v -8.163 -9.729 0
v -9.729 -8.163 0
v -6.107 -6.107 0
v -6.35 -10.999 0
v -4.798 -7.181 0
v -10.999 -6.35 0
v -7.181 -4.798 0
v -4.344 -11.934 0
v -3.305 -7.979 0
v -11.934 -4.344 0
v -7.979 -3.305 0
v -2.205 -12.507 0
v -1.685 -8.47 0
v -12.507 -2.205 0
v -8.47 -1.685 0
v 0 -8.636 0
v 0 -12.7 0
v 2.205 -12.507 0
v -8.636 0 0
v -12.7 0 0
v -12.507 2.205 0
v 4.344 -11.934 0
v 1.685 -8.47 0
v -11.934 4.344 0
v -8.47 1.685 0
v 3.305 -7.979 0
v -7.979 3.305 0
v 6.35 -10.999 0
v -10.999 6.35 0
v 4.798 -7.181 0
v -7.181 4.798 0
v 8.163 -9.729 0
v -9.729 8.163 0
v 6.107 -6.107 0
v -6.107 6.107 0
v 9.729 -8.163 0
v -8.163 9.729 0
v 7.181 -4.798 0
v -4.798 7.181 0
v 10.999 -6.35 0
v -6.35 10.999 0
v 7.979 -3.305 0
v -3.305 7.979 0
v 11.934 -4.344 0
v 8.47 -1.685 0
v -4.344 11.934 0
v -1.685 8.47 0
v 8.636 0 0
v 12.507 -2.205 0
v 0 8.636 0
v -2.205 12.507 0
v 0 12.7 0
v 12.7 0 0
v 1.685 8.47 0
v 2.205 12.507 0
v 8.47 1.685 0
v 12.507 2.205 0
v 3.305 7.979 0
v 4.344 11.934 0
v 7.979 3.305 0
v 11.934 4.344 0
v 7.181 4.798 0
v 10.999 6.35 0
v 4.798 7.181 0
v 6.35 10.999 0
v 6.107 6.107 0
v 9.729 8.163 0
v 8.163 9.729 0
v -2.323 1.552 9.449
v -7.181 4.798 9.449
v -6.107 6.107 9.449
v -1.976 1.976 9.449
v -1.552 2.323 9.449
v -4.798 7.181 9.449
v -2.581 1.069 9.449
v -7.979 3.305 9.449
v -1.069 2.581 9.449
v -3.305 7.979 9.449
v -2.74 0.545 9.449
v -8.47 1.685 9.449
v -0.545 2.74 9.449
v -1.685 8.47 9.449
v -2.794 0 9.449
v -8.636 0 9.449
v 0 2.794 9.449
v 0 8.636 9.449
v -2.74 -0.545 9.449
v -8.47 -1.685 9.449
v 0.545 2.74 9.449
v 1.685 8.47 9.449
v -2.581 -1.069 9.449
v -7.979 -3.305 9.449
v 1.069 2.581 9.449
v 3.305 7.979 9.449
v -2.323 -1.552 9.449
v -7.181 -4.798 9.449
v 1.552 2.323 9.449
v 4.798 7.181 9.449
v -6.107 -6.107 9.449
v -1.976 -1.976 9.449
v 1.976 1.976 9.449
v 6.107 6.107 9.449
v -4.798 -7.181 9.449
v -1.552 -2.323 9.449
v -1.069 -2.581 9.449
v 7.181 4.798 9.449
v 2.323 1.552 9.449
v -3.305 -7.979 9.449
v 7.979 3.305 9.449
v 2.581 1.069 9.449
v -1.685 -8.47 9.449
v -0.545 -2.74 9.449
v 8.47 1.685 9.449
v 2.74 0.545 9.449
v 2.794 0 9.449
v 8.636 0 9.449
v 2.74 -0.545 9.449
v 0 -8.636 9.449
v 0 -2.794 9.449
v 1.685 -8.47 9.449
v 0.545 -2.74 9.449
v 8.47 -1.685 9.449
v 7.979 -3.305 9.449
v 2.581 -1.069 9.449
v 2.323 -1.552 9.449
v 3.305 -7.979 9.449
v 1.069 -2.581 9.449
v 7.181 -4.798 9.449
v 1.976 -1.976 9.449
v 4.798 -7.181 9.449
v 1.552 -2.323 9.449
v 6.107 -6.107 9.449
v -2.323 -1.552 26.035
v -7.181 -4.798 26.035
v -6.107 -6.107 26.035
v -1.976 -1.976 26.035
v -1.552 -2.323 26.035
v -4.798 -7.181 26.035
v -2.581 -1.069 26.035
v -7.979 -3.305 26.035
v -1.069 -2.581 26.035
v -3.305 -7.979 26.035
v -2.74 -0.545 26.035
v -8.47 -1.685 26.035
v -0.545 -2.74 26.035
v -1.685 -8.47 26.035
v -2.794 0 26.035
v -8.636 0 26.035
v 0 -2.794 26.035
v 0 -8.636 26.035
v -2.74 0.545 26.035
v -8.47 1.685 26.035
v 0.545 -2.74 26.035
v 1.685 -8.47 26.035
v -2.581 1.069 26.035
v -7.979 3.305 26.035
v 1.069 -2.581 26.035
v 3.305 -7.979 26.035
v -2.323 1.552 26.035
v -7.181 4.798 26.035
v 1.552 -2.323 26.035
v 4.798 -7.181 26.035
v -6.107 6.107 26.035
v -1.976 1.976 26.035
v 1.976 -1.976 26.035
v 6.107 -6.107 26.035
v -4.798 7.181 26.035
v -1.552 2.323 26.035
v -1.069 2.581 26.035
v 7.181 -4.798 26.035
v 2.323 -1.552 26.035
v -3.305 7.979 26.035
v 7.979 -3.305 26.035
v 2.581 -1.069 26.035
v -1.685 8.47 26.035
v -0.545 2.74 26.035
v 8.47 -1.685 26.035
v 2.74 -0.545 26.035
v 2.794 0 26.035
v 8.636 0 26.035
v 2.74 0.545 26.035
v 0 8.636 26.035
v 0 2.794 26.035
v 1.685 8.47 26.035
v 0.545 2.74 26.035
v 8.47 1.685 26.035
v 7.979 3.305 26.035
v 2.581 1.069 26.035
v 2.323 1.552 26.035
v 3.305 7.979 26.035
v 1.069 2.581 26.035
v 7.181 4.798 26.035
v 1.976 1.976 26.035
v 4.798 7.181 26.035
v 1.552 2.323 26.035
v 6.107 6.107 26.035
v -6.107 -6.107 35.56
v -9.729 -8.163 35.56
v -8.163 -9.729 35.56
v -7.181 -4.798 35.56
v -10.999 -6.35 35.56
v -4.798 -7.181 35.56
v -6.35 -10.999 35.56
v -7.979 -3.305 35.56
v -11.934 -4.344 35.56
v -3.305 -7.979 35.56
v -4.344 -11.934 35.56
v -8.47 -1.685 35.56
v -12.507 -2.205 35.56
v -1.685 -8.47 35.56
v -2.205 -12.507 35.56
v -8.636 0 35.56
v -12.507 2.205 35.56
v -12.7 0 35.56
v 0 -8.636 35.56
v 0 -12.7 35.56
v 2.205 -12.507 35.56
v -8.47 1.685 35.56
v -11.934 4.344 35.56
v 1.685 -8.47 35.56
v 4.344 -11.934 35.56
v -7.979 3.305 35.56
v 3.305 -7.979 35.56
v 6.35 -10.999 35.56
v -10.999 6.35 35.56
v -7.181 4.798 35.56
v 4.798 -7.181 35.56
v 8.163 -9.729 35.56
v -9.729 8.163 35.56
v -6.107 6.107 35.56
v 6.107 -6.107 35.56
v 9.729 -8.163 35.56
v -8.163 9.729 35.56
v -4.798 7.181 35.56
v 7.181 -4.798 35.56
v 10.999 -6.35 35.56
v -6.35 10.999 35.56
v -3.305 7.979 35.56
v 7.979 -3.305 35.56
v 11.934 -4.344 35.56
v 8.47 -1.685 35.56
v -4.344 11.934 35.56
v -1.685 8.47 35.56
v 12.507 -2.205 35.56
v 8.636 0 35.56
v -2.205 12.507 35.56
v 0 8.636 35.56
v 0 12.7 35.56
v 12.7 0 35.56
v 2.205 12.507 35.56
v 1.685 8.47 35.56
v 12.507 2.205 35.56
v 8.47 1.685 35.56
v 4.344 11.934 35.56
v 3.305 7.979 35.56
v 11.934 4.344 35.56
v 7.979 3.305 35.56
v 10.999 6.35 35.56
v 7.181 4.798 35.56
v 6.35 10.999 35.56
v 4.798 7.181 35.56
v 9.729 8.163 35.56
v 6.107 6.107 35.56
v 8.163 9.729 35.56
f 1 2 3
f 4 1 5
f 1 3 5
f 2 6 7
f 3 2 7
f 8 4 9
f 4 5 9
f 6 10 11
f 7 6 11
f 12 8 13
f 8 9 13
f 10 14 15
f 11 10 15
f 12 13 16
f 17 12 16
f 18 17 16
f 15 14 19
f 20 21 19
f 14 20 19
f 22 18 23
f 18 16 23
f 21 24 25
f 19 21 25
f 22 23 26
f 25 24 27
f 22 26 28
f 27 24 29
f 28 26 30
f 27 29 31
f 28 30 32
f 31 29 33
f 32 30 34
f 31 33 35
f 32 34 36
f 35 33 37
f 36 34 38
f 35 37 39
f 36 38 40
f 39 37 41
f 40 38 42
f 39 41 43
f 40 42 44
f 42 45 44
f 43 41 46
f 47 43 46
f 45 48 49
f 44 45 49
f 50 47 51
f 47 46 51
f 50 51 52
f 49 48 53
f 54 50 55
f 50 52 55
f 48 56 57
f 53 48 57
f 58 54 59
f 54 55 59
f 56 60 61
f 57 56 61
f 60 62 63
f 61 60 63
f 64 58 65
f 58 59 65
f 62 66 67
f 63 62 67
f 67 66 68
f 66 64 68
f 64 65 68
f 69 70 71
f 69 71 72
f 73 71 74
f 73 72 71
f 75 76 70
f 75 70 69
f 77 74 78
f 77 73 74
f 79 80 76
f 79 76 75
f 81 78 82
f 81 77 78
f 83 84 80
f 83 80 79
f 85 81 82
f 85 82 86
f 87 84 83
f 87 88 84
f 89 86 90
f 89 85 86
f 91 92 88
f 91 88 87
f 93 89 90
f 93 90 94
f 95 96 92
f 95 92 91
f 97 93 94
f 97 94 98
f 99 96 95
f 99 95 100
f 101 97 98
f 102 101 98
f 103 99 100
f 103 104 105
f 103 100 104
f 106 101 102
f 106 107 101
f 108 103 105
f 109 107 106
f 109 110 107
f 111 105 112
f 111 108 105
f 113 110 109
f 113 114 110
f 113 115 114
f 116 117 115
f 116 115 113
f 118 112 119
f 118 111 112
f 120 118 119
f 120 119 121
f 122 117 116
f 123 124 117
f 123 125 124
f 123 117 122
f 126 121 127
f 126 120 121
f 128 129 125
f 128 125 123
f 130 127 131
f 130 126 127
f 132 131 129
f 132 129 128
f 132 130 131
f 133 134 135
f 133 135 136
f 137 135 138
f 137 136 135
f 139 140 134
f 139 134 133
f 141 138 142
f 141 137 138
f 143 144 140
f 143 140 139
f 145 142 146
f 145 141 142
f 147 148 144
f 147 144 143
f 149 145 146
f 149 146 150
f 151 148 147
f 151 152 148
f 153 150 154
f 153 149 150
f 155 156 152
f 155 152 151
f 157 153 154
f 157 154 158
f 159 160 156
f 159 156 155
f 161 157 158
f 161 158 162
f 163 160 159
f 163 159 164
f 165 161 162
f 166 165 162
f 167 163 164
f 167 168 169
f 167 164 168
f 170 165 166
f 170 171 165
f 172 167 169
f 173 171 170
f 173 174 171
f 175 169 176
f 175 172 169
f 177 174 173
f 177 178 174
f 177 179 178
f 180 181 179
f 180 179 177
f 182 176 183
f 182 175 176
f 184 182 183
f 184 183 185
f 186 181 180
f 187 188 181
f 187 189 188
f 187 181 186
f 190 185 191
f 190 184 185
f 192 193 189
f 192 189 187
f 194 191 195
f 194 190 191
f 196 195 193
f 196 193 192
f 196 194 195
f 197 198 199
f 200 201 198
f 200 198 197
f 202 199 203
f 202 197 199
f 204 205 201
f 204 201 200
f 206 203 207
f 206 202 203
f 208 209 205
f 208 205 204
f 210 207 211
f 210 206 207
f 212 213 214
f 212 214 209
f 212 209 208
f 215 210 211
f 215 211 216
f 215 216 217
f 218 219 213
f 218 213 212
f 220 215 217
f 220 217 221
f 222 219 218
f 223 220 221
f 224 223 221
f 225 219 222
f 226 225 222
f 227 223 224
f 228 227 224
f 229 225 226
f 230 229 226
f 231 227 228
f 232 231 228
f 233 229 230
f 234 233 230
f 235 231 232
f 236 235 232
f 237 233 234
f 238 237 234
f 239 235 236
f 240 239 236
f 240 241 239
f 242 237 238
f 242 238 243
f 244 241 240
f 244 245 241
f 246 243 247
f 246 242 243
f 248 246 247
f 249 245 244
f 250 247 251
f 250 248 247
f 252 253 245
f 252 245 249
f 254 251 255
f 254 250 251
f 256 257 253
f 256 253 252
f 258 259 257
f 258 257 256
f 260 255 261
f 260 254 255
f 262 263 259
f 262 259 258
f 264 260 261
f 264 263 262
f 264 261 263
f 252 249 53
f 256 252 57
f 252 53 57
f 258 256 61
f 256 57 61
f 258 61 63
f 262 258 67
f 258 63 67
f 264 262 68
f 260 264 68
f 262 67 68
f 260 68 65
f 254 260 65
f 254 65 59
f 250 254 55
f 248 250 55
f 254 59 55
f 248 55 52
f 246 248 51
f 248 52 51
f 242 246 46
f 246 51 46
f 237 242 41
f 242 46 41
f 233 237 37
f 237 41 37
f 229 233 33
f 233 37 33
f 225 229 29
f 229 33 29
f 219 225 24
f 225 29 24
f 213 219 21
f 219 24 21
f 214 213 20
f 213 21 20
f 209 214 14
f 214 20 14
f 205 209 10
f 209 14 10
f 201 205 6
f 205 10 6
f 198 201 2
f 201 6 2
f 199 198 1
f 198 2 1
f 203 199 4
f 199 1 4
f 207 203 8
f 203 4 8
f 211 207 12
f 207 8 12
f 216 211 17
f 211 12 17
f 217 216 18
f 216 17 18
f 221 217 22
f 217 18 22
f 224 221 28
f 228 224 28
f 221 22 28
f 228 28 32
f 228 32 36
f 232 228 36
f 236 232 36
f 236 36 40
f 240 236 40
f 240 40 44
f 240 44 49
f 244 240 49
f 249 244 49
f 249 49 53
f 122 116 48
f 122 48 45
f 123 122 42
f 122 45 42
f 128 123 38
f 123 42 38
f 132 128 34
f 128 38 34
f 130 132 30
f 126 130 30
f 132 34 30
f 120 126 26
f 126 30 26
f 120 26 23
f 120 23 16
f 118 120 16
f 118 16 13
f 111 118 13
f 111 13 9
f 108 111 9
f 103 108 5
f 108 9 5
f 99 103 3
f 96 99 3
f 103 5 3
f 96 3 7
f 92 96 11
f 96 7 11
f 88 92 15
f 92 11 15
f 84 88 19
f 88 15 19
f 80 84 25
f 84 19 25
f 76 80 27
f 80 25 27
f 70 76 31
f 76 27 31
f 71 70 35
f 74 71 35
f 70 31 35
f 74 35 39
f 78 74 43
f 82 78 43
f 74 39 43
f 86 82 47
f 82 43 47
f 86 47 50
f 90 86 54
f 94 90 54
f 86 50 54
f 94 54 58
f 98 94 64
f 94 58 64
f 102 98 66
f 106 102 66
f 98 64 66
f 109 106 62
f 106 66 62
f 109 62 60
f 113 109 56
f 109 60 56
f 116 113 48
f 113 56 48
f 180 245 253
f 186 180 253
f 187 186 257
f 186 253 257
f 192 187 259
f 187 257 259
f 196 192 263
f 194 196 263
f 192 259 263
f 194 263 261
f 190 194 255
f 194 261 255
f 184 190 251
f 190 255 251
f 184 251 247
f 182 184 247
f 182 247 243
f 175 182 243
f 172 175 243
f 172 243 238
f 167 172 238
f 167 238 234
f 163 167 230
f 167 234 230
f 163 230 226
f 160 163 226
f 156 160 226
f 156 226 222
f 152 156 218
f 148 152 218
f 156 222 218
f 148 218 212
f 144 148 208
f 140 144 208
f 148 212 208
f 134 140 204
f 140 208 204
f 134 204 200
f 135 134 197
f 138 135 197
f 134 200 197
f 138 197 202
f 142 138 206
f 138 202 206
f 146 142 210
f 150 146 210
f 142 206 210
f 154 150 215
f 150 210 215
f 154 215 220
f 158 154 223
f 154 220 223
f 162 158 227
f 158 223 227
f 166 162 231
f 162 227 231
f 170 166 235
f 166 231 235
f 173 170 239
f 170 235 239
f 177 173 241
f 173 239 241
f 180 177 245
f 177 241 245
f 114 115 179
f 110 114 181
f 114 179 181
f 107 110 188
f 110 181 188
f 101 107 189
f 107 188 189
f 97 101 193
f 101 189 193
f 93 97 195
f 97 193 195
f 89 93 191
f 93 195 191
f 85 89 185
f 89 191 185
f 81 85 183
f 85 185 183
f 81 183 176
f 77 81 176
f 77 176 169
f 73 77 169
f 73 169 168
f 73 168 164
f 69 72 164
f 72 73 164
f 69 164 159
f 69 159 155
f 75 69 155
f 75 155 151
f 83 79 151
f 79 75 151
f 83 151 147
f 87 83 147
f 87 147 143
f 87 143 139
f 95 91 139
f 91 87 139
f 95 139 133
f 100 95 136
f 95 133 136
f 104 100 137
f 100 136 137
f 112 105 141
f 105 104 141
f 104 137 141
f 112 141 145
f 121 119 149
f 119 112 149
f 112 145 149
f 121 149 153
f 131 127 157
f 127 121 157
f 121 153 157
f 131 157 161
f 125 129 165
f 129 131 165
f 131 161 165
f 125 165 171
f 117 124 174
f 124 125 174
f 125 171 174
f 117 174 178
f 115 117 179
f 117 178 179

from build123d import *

# Parameters (mm, degrees)
F0_R     = 12.7
F1_DEPTH = 35.56
F2_R     = 8.636
F3_DEPTH = 9.525
F4_R     = 2.794
F5_DEPTH = 254
F6_R     = 8.636
F6_R_2   = 2.794
F8_DEPTH = 9.4488


with BuildPart() as f1:
    # F0 (on Top) → F1 (new body)
    with BuildSketch(Plane.XY):
        Circle(F0_R)
    extrude(amount=F1_DEPTH)

    # F2 (on face) → F3 (cut)
    with BuildSketch(Plane.XY.offset(35.56)):
        Circle(F2_R)
    extrude(amount=-F3_DEPTH, mode=Mode.SUBTRACT)

    # F4 (on face) → F5 (cut)
    with BuildSketch(Plane.XY.offset(26.035)):
        Circle(F4_R)
    extrude(amount=-F5_DEPTH, mode=Mode.SUBTRACT)

    # F6 (on face) → F8 (cut)
    with BuildSketch(Plane(origin=(0, 0, 0), x_dir=(1, 0, 0), z_dir=(0, 0, -1))):
        Circle(F6_R)
        Circle(F6_R_2, mode=Mode.SUBTRACT)
    extrude(amount=-F8_DEPTH, mode=Mode.SUBTRACT)


solid = f1.part
